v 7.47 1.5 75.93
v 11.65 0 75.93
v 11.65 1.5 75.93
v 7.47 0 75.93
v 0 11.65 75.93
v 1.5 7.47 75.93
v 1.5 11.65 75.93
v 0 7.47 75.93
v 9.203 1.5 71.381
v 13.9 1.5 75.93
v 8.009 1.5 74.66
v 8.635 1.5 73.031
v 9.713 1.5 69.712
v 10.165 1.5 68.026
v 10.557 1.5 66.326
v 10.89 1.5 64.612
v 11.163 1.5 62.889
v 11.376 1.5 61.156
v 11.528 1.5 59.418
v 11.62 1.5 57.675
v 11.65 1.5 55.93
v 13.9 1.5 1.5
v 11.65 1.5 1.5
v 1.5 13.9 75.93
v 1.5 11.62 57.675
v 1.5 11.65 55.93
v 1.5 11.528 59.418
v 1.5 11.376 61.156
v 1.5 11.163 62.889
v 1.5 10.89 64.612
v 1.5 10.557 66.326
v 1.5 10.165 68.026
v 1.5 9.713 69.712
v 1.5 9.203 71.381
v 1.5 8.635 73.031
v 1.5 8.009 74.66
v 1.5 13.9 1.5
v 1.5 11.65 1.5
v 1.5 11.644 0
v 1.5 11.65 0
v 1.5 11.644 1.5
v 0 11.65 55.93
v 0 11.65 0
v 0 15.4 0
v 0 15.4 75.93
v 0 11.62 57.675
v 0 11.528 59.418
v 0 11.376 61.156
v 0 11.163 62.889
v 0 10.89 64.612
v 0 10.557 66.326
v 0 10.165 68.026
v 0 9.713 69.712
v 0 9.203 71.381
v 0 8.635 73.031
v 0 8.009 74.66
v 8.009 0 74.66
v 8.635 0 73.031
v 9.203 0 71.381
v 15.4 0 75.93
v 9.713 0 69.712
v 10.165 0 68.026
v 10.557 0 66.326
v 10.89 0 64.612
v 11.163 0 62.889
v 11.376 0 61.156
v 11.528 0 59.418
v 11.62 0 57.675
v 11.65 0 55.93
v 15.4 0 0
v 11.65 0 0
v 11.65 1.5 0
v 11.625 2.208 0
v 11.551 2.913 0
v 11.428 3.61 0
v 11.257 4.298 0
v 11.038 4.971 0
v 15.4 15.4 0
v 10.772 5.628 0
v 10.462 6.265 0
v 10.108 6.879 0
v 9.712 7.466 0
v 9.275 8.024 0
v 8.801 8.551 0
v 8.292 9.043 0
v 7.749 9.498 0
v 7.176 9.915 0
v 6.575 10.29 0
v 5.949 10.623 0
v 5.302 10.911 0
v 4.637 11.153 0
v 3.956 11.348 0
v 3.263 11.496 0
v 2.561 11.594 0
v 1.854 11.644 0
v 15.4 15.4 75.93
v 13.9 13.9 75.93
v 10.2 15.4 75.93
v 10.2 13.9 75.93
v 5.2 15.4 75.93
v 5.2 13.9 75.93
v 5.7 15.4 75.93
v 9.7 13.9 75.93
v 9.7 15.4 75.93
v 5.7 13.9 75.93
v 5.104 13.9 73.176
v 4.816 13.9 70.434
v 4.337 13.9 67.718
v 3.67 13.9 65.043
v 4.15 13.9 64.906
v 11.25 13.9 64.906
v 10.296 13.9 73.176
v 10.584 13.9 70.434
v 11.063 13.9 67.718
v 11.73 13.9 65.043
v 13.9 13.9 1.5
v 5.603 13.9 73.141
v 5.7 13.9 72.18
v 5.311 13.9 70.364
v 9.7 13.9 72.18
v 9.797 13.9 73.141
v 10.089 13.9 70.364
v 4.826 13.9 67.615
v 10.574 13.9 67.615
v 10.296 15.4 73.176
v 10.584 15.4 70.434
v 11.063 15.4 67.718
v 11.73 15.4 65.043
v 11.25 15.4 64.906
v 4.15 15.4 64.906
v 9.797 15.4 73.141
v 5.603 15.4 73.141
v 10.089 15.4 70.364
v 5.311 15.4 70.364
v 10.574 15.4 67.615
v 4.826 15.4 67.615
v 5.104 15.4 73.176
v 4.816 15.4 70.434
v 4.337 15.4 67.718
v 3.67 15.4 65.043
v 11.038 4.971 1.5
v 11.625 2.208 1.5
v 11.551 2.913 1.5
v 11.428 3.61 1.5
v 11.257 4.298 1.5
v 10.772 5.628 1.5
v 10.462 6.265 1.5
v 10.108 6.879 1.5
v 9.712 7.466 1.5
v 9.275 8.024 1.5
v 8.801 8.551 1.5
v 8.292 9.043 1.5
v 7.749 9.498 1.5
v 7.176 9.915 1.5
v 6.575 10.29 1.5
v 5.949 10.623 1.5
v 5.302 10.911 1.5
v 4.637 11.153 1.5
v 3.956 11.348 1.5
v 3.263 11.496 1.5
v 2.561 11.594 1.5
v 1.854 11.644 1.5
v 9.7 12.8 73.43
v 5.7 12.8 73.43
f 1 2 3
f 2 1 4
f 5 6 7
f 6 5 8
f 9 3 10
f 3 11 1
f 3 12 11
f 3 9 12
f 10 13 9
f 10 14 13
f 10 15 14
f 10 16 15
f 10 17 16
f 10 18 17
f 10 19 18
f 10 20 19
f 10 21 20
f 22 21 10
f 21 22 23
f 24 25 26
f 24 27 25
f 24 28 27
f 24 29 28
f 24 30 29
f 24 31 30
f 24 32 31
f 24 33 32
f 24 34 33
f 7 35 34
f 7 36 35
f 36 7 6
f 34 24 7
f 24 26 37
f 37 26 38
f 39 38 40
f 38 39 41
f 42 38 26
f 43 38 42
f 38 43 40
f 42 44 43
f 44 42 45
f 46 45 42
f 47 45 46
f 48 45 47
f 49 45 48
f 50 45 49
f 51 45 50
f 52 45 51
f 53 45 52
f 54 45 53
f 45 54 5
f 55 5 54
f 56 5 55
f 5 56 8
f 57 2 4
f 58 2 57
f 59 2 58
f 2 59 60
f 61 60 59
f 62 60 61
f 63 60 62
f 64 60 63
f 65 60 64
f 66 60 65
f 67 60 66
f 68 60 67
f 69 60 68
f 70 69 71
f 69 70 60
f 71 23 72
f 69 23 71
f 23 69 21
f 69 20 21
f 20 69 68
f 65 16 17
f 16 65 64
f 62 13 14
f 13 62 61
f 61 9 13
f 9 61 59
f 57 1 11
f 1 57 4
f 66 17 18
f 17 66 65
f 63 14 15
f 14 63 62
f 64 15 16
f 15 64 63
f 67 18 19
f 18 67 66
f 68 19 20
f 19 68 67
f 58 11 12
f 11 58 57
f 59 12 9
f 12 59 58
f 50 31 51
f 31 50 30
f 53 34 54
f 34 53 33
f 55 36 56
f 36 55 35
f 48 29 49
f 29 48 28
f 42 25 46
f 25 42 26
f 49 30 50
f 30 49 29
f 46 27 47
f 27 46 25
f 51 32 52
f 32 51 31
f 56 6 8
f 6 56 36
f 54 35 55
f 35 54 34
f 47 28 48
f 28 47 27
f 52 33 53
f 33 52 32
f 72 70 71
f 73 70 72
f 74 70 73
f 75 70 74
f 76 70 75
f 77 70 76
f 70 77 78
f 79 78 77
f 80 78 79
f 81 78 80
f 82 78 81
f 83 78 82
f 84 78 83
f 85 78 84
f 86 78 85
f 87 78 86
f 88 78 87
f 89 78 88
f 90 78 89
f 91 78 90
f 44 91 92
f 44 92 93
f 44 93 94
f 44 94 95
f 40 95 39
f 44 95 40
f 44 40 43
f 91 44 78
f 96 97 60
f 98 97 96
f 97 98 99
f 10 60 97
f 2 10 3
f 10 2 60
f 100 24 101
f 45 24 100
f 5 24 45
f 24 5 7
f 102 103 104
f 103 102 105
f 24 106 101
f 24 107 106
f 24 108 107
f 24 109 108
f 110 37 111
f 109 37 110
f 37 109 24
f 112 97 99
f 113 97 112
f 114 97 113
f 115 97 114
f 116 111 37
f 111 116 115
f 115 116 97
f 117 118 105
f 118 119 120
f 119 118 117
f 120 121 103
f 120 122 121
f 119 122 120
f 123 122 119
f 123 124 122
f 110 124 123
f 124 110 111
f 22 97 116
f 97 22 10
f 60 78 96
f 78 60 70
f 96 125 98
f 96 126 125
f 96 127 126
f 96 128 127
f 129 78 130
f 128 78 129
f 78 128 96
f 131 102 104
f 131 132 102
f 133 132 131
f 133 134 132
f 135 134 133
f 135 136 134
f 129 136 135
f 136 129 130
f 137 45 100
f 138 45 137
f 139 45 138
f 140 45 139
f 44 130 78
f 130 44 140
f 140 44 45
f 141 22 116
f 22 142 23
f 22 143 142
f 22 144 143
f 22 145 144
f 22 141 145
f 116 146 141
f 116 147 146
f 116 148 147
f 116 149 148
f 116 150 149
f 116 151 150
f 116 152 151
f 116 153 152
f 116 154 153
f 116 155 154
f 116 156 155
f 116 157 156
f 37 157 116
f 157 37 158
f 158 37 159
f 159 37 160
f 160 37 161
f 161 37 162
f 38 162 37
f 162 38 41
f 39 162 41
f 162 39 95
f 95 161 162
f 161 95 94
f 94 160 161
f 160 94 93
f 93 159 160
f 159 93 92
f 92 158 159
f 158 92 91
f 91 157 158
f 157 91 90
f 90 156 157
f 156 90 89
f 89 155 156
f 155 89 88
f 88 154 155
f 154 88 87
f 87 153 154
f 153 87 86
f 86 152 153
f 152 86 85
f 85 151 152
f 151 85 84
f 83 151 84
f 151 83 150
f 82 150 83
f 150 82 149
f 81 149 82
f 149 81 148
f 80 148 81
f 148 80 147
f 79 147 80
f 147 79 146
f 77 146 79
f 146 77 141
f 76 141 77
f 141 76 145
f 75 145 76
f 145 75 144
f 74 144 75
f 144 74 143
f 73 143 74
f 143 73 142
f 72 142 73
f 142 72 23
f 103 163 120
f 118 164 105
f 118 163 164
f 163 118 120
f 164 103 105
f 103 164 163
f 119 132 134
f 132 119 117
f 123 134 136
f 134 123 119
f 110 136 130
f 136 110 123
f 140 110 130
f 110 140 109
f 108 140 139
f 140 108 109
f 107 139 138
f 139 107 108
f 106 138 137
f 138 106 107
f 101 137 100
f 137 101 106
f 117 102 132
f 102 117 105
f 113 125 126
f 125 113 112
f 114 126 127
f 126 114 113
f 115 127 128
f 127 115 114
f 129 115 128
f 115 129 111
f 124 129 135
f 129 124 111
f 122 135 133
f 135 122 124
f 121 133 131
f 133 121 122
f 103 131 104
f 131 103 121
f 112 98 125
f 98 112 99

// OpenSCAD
/*
A small part which securely stores and conveniently dispenses 6-sided dice.

Default configuration holds 6 Chessex 12mm dice, but the design is parameterized to
easily allow for other amounts of dice, or to use different dice sizes or tolerances with
a little more effort.
*/

// Number of dice to generate for
num_dice = 6;

// Dimensions of the dice, with tolerance
die_width = 12.40;
die_height = 11.93;

// Thickness of all body walls
wall_thick = 1.5;

// Width of the walls that hold the dice in
retainer_width = 2.25;

// Size of the detent "bump" holding the dice in
detent_height = 3.75;
detent_middle = 1.25;
detent_depth = 1.1;
detent_width = 4;

// Size of the slots either side of the detent
cutout_width = 0.5;
cutout_height = 8;
cutout_radius = 40;
cutout_angle = 16; // Portion of circle to use for cutouts, in degrees

// Space above the top of the last die; used to align the detent
ramp_height = 2.85;

// Total height and radius to use for "lips" that constrict toward the opening
lip_radius = 50;
lip_height = 20;

// Tolerance value to avoid floating point errors in render
epsil = 0.001;


module body() {
    linear_extrude(wall_thick + num_dice * die_height + ramp_height) {
        difference() {
            square(die_width + 2*wall_thick);
            translate([wall_thick, wall_thick]) {
                square(die_width);
            }
            square(die_width + wall_thick - retainer_width);
        }
    }
}

module cap() {
    linear_extrude(wall_thick) {
        translate([wall_thick, wall_thick]) {
            difference() {
                square(die_width);
                circle(die_width - retainer_width, $fn=90);
            }
        }
    }
}

module detent() {
    rotate(-90, [0,0,1]) {
        rotate(90, [1,0,0]) {
            linear_extrude(detent_width) {
                polygon([
                    [0,0],
                    [detent_depth,detent_middle],
                    [0,detent_height]
                ]);
            }
        }
    }
}

module lips_cyl() {
    translate([0, -epsil, 0]) {
        rotate(-90, [1,0,0]) {
            linear_extrude(wall_thick + 2*epsil) {
                translate([-lip_radius + die_width + wall_thick - retainer_width, 0, 0]) {
                    circle(lip_radius, $fn=180);
                }
            }
        }
    }
}

module lips() {
    difference() {
        linear_extrude(lip_height) {
            difference() {
                square(wall_thick + die_width - retainer_width);
                translate([wall_thick, wall_thick]) {
                    square(die_width);
                }
            }
        }
        lips_cyl();
        mirror([1,-1,0]) {
            lips_cyl();
        }
    }
}

module cutouts() {
    translate([0,0,-cutout_height-ramp_height]) {
        cube([cutout_width, wall_thick + 2*epsil, cutout_height + ramp_height]);
        translate([cutout_width + detent_width, 0, 0]) {
            cube([cutout_width, wall_thick + 2*epsil, cutout_height + ramp_height]);
        }
    }
}

module round_cutouts() {
    rotate(-90, [1,0,0]) {
        linear_extrude(wall_thick + 2*epsil) {
            translate([-cutout_radius+cutout_width, 0]) {
                intersection() {
                    difference() {
                        circle(cutout_radius, $fn=90);
                        circle(cutout_radius-cutout_width, $fn=90);
                    }
                    polygon([
                        [0,0],
                        [999*cos(cutout_angle),999*sin(cutout_angle)],
                        [999,0]
                    ]);
                }
            }
            translate([cutout_radius+detent_width+cutout_width, 0]) {
                intersection() {
                    difference() {
                        circle(cutout_radius, $fn=90);
                        circle(cutout_radius-cutout_width, $fn=90);
                    }
                    polygon([
                        [0,0],
                        [-999*cos(cutout_angle),999*sin(cutout_angle)],
                        [-999,0]
                    ]);
                }
            }
        }
    }
}

module holder() {
    // Align and put together all the bits
    difference() {
        union() {
            body();
            cap();
            translate([
                (wall_thick*2 + die_width + detent_width)/2,
                wall_thick + die_width,
                wall_thick + num_dice*die_height + ramp_height - detent_height
            ]) {
                detent();
            }
            translate([0, 0, wall_thick + num_dice*die_height + ramp_height - lip_height]) {
                lips();
            }
        }
        translate([
            wall_thick + (die_width - detent_width)/2 - cutout_width,
            wall_thick + die_width - epsil,
            wall_thick + die_height*num_dice + ramp_height + epsil
        ]) {
          union() {
            //cutouts();
            round_cutouts();
          }
        }
    }
}

module on_axis_holder() {
    translate([-1.5*wall_thick - die_width, -1.5*wall_thick - die_width, 0]) {
        holder();
    }
}

module triholder() {
    on_axis_holder();
    rotate(120, [0,0,1]) {
        on_axis_holder();
    }
    rotate(-120, [0,0,1]) {
        on_axis_holder();
    } 
}

render(convexity=8) {
    holder();
}
